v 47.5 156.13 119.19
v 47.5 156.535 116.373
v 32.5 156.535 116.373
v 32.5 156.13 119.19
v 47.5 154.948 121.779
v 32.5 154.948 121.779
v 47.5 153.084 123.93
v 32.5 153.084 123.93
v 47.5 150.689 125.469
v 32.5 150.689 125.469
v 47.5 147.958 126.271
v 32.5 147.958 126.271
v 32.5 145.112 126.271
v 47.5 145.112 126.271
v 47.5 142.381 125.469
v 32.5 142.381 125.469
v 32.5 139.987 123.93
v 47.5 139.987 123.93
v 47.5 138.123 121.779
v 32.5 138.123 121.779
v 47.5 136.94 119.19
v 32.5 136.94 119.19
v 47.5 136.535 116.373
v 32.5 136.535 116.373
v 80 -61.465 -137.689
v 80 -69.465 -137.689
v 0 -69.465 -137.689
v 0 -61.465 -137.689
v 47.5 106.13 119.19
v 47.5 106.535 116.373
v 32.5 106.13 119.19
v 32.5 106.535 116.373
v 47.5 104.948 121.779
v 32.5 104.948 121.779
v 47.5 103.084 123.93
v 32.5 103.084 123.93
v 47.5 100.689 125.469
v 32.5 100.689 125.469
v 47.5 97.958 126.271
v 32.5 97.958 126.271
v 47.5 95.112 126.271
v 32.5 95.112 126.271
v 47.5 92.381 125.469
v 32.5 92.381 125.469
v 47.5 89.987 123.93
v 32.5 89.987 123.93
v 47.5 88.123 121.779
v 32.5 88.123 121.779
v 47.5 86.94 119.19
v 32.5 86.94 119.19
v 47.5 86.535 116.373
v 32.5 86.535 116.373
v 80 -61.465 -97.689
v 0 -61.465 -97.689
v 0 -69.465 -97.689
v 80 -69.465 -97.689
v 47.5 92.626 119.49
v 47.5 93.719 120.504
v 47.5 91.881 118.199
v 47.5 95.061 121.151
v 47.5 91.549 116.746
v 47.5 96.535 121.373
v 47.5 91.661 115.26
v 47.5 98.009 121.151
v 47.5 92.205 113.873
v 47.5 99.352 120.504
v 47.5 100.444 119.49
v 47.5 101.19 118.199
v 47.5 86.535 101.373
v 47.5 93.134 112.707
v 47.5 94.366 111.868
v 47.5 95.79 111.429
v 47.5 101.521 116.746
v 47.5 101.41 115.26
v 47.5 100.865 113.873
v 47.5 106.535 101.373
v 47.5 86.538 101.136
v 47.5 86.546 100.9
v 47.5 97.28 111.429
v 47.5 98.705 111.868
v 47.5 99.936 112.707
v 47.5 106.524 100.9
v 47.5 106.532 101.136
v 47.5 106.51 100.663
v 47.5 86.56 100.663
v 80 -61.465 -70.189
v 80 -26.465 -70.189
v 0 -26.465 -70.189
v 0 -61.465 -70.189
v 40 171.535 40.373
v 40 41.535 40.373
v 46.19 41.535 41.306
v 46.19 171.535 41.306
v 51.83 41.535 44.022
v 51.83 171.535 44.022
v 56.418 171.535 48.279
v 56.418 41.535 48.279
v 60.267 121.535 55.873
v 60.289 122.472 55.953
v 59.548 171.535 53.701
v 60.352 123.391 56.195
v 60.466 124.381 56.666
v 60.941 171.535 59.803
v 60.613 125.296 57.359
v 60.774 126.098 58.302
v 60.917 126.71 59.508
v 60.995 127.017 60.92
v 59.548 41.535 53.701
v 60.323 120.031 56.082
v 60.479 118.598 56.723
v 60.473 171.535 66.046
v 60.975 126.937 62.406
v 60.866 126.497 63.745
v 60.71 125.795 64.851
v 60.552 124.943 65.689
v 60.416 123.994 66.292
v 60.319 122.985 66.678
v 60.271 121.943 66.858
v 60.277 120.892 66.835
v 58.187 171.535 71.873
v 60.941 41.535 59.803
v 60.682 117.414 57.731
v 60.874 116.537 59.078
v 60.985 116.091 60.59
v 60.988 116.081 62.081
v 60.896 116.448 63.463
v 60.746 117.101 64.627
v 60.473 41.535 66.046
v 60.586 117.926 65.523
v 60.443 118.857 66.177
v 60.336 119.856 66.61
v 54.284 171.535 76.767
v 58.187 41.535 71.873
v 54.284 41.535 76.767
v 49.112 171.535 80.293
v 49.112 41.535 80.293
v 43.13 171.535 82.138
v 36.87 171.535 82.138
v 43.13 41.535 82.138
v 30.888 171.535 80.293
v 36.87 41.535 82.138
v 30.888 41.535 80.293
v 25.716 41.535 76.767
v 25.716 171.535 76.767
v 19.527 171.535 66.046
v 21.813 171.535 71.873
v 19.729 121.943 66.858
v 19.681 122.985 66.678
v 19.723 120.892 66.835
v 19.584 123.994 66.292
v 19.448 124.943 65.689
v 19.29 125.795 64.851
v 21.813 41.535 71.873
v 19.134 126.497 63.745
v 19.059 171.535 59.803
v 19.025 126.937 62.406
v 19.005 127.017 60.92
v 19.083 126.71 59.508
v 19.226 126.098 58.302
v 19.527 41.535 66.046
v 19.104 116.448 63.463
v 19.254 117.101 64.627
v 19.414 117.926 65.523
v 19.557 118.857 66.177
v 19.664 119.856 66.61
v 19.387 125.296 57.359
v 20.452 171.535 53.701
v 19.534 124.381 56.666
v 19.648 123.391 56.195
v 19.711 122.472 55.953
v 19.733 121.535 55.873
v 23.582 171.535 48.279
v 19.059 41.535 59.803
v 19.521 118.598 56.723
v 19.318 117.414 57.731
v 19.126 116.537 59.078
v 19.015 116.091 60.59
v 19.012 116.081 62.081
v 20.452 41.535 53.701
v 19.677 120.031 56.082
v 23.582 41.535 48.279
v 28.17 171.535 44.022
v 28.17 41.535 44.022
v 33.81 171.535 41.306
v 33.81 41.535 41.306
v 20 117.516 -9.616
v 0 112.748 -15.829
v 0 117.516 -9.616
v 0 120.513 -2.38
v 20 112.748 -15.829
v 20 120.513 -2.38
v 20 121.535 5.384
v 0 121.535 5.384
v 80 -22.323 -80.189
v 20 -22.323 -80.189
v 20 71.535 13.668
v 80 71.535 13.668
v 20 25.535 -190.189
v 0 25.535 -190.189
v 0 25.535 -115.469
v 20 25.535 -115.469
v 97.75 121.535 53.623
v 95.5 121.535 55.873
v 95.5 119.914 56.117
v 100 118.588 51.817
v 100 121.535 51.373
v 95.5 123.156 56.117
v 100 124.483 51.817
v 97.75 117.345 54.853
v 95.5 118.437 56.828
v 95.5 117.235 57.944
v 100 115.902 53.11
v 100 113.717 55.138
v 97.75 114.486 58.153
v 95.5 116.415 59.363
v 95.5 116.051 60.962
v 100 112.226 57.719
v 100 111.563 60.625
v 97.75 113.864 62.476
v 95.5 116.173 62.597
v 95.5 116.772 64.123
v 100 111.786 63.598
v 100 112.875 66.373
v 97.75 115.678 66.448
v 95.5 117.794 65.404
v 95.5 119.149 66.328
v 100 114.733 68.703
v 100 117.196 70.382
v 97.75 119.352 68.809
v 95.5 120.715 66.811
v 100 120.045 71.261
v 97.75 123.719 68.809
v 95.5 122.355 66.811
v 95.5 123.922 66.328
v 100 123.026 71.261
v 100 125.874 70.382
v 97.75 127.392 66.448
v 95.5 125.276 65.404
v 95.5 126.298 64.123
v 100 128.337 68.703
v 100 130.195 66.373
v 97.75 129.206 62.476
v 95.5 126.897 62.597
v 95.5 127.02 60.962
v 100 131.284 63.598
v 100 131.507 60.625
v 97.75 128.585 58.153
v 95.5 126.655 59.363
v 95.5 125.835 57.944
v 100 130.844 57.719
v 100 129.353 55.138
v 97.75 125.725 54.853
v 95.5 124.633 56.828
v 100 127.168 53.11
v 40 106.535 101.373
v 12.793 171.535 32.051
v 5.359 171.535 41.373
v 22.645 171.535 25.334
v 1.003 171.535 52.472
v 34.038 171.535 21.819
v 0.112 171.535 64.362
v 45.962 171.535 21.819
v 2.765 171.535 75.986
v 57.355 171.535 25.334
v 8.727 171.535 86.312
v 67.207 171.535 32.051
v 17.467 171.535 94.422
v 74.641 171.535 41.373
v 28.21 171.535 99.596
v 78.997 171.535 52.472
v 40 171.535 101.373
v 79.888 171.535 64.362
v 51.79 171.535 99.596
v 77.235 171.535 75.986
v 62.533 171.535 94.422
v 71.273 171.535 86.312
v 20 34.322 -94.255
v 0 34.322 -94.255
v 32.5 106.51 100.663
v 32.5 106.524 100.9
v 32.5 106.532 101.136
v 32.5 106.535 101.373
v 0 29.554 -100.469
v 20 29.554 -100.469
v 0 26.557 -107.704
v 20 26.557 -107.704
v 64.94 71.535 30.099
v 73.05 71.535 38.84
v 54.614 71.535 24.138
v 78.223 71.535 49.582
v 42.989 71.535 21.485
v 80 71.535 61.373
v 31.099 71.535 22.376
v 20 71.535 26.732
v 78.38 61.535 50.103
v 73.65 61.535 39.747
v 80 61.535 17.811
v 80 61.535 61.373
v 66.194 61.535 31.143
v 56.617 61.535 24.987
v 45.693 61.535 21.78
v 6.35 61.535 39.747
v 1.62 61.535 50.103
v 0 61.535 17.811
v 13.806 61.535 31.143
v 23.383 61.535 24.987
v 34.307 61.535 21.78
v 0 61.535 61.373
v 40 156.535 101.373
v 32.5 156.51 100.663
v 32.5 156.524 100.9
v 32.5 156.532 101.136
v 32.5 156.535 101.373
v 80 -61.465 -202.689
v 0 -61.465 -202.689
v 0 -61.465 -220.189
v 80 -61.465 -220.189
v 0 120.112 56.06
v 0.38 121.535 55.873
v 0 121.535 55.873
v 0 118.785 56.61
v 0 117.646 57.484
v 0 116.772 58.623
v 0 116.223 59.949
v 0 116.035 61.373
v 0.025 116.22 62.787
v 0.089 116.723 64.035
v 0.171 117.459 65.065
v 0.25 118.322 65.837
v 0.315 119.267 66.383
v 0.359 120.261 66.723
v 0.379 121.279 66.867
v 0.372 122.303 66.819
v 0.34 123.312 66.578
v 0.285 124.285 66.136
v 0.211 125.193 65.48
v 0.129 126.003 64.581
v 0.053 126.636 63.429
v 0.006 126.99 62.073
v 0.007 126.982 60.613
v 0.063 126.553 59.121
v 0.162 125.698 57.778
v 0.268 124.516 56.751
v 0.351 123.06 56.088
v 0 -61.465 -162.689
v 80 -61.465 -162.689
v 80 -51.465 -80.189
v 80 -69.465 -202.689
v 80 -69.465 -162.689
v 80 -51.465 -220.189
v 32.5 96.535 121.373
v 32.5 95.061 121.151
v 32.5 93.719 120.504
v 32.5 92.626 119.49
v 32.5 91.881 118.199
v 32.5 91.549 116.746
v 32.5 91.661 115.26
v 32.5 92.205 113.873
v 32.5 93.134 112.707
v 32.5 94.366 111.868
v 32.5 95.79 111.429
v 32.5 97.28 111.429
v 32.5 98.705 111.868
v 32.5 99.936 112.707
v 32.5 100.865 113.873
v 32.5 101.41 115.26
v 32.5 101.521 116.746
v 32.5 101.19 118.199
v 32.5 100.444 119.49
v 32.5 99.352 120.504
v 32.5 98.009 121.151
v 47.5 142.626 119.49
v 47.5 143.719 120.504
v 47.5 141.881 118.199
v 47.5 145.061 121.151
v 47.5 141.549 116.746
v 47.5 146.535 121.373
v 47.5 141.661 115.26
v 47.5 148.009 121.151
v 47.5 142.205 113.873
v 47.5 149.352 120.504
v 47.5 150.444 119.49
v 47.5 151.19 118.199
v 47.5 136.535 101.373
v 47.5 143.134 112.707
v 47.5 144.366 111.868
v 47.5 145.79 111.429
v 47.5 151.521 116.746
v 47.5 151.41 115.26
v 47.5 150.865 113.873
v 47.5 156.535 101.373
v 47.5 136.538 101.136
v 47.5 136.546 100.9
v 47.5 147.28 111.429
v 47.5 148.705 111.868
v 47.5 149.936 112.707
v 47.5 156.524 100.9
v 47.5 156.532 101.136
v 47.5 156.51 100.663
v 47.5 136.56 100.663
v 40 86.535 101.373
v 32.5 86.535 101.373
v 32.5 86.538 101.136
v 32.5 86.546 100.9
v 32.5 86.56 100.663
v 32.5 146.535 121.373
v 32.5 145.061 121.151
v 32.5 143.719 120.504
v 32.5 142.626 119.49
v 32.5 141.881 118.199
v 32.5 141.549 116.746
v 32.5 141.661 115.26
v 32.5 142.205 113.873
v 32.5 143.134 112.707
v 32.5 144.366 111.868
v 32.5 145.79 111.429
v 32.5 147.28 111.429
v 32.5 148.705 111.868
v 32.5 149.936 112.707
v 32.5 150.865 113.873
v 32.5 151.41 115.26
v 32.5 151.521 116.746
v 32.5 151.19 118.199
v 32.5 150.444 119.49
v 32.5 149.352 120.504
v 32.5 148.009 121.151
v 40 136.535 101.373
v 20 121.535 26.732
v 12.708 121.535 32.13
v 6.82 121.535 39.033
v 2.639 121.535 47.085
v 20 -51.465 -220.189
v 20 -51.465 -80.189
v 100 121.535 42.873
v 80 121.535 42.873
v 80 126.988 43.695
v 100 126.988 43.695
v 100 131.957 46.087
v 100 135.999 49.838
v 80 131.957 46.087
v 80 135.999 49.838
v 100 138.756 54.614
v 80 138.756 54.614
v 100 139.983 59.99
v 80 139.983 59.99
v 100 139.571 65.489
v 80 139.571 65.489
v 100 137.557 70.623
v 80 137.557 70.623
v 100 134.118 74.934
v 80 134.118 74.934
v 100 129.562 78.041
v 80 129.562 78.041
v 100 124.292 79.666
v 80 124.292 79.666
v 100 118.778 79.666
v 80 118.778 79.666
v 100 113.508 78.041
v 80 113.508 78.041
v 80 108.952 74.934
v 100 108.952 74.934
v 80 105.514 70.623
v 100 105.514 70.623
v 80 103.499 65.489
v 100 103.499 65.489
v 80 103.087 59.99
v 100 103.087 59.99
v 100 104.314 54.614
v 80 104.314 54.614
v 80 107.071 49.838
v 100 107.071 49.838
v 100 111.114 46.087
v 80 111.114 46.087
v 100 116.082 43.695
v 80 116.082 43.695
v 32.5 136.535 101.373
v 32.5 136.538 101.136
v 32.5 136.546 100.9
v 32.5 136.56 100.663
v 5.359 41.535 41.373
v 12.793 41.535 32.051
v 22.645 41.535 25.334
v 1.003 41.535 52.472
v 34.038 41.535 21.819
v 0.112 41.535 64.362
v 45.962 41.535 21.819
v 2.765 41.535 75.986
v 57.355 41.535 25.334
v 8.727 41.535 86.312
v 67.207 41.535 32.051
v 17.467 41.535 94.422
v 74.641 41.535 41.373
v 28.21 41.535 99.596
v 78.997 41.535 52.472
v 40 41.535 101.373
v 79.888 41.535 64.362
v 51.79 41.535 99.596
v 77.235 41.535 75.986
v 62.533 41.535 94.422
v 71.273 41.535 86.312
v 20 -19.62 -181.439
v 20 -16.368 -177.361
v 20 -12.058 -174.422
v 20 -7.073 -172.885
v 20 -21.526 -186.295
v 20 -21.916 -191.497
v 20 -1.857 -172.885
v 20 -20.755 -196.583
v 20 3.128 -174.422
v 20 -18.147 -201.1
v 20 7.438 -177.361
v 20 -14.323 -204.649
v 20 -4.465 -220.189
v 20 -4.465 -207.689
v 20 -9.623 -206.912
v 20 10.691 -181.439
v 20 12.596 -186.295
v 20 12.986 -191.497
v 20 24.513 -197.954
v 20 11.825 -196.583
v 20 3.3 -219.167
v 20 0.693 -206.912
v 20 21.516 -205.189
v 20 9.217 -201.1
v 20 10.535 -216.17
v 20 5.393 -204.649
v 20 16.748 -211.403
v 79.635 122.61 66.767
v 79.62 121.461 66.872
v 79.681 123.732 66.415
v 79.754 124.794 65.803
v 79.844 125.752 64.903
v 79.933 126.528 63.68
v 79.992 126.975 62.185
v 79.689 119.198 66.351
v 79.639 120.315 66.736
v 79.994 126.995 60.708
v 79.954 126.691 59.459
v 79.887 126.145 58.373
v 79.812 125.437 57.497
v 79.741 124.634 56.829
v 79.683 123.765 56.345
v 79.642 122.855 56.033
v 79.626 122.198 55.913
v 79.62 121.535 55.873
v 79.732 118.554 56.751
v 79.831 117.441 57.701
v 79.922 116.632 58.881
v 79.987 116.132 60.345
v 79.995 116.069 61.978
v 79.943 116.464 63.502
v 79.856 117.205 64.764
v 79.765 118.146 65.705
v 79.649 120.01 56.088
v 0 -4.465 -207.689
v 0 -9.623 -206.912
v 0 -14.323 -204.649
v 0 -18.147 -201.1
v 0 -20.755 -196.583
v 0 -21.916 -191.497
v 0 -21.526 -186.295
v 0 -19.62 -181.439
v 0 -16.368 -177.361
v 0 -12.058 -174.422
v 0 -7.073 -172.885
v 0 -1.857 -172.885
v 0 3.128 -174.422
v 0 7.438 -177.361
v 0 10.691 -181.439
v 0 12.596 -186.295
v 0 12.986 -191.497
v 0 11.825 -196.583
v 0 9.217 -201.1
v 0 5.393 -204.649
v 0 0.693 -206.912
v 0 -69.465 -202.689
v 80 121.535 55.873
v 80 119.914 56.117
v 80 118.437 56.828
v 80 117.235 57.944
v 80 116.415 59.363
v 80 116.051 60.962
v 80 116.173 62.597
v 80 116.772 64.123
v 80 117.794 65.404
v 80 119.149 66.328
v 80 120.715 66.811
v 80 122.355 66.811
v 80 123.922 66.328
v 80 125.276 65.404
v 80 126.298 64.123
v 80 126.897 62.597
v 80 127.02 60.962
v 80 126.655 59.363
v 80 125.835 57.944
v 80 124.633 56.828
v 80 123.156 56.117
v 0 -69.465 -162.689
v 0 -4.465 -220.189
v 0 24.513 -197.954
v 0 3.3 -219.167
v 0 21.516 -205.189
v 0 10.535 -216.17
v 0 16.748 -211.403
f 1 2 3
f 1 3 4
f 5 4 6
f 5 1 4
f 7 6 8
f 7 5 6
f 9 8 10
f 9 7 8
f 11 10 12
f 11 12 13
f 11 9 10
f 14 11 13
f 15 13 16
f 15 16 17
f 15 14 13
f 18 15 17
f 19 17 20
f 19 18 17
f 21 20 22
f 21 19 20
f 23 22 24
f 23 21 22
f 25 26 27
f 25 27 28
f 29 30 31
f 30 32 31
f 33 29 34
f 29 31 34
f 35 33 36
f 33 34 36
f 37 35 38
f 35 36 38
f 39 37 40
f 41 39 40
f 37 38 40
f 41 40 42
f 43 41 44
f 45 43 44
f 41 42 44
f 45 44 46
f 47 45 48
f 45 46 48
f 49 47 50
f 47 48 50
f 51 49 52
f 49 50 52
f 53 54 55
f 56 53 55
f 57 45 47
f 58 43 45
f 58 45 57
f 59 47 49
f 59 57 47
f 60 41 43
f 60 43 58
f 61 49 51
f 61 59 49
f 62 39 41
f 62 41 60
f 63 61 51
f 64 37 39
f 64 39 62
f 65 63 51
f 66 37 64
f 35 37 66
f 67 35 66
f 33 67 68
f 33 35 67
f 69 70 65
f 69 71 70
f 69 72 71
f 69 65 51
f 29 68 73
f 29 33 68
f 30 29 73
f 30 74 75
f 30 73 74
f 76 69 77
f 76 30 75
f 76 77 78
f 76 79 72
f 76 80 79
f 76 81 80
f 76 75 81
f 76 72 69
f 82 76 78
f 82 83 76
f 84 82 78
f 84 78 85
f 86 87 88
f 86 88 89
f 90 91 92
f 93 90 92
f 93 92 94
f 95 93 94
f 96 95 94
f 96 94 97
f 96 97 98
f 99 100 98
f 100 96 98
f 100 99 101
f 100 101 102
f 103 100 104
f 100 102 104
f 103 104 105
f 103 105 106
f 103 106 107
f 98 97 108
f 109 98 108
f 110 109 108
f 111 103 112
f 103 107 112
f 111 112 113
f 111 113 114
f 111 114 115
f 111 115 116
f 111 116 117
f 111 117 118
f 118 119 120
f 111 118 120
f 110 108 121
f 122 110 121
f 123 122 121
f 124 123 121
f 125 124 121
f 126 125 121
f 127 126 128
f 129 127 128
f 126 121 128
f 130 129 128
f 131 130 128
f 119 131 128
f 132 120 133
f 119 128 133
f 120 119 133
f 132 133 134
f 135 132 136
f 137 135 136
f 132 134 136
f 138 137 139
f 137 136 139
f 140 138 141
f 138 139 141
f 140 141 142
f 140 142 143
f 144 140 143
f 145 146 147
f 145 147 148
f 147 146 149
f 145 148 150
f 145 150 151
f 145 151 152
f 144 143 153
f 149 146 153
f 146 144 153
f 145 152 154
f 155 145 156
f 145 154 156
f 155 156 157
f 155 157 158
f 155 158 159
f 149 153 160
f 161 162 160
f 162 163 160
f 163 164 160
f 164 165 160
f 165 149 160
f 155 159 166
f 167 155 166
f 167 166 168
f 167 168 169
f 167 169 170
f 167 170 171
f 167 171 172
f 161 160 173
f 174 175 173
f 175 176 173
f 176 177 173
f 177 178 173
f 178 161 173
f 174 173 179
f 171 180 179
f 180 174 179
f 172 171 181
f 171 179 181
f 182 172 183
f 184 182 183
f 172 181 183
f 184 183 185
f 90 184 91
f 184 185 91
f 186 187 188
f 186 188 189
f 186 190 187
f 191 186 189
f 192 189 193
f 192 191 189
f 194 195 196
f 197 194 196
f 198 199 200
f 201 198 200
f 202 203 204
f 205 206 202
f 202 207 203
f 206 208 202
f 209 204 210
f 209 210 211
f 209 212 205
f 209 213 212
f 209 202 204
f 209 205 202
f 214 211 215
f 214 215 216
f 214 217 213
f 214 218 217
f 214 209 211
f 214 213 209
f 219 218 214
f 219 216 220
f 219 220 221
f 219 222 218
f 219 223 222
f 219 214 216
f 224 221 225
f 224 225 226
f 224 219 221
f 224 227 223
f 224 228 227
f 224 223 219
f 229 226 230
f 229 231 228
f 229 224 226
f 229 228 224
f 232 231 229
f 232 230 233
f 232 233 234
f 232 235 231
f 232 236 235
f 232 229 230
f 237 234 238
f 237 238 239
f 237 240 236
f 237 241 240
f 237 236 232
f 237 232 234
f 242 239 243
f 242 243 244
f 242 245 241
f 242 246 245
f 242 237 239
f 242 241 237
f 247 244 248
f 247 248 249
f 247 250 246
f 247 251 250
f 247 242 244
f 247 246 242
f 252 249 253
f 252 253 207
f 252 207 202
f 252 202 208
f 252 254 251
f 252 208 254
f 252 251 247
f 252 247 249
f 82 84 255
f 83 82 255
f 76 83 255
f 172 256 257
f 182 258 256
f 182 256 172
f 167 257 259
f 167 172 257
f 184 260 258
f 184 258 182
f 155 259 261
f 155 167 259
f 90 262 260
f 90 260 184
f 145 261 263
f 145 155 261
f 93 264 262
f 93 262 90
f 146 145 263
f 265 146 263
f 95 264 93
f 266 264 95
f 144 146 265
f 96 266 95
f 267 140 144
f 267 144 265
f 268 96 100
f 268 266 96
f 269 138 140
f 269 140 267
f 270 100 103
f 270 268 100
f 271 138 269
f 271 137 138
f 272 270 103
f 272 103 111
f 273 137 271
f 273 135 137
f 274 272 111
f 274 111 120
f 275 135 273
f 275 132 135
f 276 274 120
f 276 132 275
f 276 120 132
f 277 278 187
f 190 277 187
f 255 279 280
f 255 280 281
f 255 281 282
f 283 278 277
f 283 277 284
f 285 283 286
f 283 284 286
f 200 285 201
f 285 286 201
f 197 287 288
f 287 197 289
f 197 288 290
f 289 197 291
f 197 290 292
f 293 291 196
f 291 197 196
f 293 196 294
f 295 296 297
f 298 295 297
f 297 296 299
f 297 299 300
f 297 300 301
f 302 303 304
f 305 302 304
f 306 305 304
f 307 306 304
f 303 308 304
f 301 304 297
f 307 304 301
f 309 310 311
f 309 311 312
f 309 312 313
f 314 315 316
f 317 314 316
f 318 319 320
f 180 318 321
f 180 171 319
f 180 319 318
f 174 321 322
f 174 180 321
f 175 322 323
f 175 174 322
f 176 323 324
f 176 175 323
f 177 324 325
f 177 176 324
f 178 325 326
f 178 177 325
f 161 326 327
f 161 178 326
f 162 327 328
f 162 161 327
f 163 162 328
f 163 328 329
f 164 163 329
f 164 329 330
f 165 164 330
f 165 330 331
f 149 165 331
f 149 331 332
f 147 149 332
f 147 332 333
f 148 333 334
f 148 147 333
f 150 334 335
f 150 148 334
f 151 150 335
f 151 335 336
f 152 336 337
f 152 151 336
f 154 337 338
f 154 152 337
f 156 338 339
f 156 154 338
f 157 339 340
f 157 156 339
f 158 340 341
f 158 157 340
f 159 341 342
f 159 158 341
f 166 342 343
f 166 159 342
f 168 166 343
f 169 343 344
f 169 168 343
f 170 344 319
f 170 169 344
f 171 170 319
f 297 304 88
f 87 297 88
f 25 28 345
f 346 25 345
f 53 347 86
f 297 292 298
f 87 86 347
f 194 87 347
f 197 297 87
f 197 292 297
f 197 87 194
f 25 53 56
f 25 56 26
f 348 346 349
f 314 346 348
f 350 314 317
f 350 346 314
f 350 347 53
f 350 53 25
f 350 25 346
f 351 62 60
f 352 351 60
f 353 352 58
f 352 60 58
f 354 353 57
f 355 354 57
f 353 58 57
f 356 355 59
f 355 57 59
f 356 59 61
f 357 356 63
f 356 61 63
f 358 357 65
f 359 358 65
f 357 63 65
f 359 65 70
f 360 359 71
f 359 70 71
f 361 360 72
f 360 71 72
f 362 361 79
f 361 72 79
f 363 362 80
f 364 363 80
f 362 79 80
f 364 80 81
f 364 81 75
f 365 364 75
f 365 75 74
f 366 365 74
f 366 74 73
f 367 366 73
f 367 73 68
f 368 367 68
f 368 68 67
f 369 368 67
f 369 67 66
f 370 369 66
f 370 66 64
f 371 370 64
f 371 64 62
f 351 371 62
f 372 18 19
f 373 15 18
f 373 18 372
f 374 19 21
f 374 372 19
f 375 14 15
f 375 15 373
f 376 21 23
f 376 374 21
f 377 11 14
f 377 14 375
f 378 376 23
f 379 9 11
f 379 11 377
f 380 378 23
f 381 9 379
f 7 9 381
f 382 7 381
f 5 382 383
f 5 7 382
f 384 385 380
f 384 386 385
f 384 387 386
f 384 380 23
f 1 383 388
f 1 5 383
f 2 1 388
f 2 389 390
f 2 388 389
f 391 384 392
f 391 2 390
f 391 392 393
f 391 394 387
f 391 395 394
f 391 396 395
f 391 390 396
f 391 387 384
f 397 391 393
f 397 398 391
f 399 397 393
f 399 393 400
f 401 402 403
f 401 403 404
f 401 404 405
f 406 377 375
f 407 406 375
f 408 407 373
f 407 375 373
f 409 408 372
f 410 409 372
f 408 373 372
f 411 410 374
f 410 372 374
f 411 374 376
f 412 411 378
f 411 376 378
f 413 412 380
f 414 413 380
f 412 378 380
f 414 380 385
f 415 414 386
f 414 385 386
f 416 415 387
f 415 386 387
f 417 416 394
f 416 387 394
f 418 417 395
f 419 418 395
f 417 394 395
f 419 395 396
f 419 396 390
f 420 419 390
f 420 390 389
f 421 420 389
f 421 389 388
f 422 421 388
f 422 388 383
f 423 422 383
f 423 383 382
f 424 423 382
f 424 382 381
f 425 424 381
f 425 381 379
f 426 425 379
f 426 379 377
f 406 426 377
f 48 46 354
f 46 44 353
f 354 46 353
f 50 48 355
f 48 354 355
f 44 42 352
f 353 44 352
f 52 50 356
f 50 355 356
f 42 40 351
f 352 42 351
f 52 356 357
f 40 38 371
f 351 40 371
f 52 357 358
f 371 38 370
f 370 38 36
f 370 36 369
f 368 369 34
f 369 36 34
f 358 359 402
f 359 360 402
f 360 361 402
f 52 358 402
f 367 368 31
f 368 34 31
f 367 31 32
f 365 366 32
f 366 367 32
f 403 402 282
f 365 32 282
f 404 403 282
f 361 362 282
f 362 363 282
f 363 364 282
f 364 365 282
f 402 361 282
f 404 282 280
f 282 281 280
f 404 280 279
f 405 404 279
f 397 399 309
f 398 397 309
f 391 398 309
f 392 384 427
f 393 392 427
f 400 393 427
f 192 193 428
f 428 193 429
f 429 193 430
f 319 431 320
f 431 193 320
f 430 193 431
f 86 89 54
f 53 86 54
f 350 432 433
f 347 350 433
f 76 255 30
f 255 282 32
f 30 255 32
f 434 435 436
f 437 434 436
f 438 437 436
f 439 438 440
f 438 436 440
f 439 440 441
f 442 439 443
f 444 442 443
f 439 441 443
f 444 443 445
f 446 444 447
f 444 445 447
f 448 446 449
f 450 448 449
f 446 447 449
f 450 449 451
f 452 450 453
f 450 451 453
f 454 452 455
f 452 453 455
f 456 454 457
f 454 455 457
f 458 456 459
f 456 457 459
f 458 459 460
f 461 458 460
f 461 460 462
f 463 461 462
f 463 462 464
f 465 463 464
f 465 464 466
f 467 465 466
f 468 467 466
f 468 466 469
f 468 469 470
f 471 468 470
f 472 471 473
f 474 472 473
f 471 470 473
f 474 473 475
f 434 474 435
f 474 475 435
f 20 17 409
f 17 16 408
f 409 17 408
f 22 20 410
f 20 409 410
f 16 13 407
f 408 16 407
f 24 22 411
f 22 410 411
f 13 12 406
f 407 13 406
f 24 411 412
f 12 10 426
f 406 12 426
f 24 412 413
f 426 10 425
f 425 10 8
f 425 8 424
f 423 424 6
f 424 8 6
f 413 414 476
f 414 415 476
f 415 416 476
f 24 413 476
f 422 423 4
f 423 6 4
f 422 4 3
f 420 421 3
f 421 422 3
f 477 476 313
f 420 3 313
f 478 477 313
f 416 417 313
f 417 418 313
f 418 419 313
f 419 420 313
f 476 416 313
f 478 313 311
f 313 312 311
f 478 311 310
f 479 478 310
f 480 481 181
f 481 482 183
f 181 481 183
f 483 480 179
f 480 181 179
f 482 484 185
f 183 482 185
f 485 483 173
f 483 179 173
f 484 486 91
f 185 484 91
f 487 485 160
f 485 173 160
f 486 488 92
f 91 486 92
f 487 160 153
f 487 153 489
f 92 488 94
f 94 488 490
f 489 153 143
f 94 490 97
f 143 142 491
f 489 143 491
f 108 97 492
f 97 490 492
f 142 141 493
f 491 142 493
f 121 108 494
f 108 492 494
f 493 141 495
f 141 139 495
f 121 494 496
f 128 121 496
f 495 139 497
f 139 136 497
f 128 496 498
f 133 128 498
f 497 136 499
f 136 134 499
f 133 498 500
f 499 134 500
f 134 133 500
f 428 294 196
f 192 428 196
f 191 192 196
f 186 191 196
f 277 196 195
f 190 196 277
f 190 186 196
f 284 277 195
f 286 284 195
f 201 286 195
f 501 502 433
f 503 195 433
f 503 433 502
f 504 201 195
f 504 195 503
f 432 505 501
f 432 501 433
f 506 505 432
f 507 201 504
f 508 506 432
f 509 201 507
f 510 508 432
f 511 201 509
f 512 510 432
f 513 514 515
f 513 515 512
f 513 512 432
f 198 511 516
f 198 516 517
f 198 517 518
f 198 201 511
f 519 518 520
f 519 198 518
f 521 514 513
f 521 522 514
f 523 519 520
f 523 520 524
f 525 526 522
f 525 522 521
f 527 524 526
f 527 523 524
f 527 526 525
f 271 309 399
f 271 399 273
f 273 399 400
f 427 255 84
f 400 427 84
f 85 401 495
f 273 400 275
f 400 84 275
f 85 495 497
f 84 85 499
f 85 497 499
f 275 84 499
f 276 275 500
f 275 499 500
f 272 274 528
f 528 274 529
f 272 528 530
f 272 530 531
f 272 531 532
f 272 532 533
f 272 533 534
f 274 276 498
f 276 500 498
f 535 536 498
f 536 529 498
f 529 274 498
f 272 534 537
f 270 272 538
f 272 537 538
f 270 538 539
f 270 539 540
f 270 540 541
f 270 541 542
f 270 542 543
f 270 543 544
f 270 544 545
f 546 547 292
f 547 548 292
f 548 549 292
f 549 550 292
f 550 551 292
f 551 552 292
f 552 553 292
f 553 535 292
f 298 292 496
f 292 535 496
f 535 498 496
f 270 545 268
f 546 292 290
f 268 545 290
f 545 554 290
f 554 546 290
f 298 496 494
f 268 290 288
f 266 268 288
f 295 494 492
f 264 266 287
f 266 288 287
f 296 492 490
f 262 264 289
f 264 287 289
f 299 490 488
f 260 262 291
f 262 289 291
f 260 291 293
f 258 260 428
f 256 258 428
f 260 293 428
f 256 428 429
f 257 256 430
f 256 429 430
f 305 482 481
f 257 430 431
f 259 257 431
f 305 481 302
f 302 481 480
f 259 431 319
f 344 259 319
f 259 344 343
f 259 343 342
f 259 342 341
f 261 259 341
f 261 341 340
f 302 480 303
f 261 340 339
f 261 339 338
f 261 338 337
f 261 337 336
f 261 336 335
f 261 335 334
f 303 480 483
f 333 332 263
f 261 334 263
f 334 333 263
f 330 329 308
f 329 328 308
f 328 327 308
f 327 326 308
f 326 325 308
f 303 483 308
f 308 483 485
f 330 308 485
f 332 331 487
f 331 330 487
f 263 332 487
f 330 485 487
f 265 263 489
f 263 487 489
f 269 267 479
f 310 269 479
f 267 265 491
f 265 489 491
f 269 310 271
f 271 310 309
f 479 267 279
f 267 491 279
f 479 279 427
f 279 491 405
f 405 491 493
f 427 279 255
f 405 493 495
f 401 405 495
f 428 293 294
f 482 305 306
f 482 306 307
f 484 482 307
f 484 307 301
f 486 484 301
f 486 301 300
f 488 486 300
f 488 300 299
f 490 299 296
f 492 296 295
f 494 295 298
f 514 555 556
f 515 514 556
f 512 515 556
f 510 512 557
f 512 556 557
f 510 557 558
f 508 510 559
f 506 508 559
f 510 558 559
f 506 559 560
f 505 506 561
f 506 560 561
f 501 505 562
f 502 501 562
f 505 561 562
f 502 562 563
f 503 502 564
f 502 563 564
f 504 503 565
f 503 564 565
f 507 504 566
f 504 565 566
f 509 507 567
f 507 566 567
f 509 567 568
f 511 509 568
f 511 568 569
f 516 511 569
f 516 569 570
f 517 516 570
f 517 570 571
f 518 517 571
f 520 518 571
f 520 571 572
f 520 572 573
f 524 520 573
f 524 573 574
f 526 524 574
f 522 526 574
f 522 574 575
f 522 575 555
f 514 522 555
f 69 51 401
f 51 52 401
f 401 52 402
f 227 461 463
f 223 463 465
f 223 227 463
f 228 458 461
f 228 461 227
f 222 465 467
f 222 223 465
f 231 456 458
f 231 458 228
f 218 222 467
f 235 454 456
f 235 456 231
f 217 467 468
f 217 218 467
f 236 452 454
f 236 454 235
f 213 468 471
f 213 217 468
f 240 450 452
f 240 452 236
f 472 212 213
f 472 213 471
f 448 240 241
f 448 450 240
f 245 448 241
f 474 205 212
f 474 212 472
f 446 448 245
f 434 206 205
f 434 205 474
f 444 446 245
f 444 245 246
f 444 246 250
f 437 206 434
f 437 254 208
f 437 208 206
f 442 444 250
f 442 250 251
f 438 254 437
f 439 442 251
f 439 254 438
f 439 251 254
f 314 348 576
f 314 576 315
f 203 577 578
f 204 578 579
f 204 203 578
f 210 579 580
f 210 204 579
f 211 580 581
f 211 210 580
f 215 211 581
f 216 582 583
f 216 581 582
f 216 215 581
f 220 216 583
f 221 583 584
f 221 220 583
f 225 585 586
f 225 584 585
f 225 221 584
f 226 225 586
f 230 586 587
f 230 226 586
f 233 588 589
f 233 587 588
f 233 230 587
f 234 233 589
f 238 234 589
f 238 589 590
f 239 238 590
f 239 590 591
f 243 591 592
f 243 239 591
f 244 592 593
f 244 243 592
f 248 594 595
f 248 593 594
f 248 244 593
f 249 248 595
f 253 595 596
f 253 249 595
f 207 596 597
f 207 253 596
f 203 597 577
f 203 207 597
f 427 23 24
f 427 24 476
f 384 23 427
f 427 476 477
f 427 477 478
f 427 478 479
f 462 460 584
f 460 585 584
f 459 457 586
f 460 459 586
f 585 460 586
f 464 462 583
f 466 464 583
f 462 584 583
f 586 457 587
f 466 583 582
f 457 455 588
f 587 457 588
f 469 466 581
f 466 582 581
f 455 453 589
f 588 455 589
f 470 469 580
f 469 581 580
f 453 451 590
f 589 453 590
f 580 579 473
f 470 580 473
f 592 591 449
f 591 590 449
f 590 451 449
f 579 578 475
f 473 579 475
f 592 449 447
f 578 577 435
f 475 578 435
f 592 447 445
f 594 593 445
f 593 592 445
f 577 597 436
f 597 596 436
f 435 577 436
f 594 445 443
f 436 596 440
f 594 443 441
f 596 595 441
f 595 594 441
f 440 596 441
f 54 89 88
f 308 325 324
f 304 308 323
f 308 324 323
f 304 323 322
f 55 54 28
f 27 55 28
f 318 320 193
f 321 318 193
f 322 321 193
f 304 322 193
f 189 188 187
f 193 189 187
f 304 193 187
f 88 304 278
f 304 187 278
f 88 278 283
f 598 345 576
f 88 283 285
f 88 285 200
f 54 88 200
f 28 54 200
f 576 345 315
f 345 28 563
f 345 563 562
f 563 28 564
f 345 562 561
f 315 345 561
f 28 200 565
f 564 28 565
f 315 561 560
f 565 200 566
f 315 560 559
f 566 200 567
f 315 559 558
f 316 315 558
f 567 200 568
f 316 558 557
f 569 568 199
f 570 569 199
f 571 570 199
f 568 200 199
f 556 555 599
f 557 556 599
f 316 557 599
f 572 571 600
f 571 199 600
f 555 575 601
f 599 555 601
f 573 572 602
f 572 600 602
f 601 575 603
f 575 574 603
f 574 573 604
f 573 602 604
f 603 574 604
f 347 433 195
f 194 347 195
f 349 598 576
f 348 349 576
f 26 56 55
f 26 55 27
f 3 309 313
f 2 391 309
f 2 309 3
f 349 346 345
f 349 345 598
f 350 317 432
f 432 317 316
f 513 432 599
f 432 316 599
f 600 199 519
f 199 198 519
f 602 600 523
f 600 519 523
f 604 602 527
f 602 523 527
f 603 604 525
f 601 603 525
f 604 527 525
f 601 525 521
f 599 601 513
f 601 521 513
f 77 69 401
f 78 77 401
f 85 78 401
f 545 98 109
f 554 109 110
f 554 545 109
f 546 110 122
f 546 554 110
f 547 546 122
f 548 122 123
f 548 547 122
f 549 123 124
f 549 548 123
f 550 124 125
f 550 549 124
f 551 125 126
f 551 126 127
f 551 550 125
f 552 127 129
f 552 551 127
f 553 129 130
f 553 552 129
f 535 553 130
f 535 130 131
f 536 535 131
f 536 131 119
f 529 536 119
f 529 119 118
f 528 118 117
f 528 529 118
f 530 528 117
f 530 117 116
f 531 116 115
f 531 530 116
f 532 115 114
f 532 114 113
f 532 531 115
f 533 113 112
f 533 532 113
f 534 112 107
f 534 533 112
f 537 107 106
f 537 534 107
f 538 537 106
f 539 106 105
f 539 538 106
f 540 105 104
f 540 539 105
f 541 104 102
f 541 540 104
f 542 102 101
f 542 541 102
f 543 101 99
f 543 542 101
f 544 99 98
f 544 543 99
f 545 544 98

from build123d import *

# Parameters (mm, degrees)
SKETCH1_W                  = 40
SKETCH1_H                  = 2.522686521
BOSS_EXTRUDE1_DEPTH        = 80
BOSS_EXTRUDE2_DEPTH        = 20
FILLET1_R                  = 30
F_25_0_35_DIAMETER_HOLE1_D = 35
BOSS_EXTRUDE3_DEPTH        = 50
BOSS_EXTRUDE3_DEPTH_BACK   = 80
SKETCH3_R                  = 40
BOSS_EXTRUDE4_DEPTH        = 7.5
F_25_0_42_DIAMETER_HOLE1_D = 42
F_10_0_10_DIAMETER_HOLE1_D = 10
SKETCH7_R                  = 18.5
BOSS_EXTRUDE5_DEPTH        = 20


with BuildPart() as part:
    # Sketch1 → Boss-Extrude1 (new body)
    with BuildSketch(Plane(origin=(0, 0, 0), x_dir=(0, 0, -1), z_dir=(1, 0, 0))):
        Polygon((137.68936662, -61.464817383), (97.68936662, -61.464817383), (97.68936662, -69.464817383), (137.68936662, -69.464817383), (137.68936662, -66.026855296), align=None)
        Polygon((-13.668497756, 71.535182617), (-61.372704525, 71.535182617), (-61.372704525, 61.535182617), (-17.81063338, 61.535182617), (70.18936662, -26.464817383), (70.18936662, -61.464817383), (97.68936662, -61.464817383), (97.68936662, -58.942130862), (137.68936662, -58.942130862), (137.68936662, -61.464817383), (150.18936662, -61.464817383), (150.18936662, -51.464817383), (80.18936662, -51.464817383), (80.18936662, -22.32268176), align=None)
        Polygon((220.18936662, -51.464817383), (150.18936662, -51.464817383), (150.18936662, -61.464817383), (162.68936662, -61.464817383), (162.68936662, -58.942130862), (202.68936662, -58.942130862), (202.68936662, -61.464817383), (220.18936662, -61.464817383), align=None)
        with Locations((182.68936662, -60.203474123)):
            Rectangle(SKETCH1_W, SKETCH1_H)
        Polygon((202.68936662, -61.464817383), (162.68936662, -61.464817383), (162.68936662, -66.026855296), (162.68936662, -69.464817383), (202.68936662, -69.464817383), align=None)
        with Locations((117.68936662, -60.203474123)):
            Rectangle(SKETCH1_W, SKETCH1_H)
    extrude(amount=BOSS_EXTRUDE1_DEPTH)

    # Sketch1<5> → Boss-Extrude2 (add)
    with BuildSketch(Plane(origin=(0, 0, 0), x_dir=(0, 0, -1), z_dir=(1, 0, 0))):
        Polygon((-61.372704525, 121.535182617), (-61.372704525, 71.535182617), (-13.668497756, 71.535182617), (80.18936662, -22.32268176), (80.18936662, -51.464817383), (220.18936662, -51.464817383), (220.18936662, 25.535182617), (103.042180363, 25.535182617), (7.042180363, 121.535182617), align=None)
    extrude(amount=BOSS_EXTRUDE2_DEPTH)

    # Fillet1
    fillet1_edges = [part.edges().sort_by_distance(p)[0] for p in [
        (10, 121.535182617, -7.042180363),
        (10, 25.535182617, -220.18936662),
        (10, 25.535182617, -103.042180363),
    ]]
    fillet(fillet1_edges, radius=FILLET1_R)

    # Ø25.0 (35) Diameter Hole1 (through all)
    with Locations(Plane(origin=(20, -4.464817383, -190.18936662), x_dir=(0, 0, 1), z_dir=(1, 0, 0))):
        with Locations((0, 0)):
            Hole(F_25_0_35_DIAMETER_HOLE1_D / 2)

    # Sketch3 → Boss-Extrude3 (add, two sides: drawn at the far end of the back side and taken through both)
    with BuildSketch(Plane(origin=(0, 121.535182617, 0), x_dir=(1, 0, 0), z_dir=(0, 1, 0)).offset(-BOSS_EXTRUDE3_DEPTH_BACK)):
        with Locations(Location((40, -61.372704525, 0), (0, 0, 270))):
            Circle(SKETCH3_R)
    extrude(amount=BOSS_EXTRUDE3_DEPTH + BOSS_EXTRUDE3_DEPTH_BACK)

    # Sketch4 → Boss-Extrude4 (add, symmetric)
    with BuildSketch(Plane.ZY.offset(-40)):
        with BuildLine():
            Line((101.372704525, 156.535182617), (116.372704525, 156.535182617))
            ThreePointArc((116.372704525, 156.535182617), (126.372704525, 146.535182617), (116.372704525, 136.535182617))
            Line((116.372704525, 136.535182617), (101.372704525, 136.535182617))
            ThreePointArc((101.372704525, 136.535182617), (91.372704525, 146.535182617), (101.372704525, 156.535182617))
        make_face()
        with BuildLine():
            Line((101.372704525, 106.535182617), (116.372704525, 106.535182617))
            ThreePointArc((116.372704525, 106.535182617), (126.372704525, 96.535182617), (116.372704525, 86.535182617))
            Line((116.372704525, 86.535182617), (101.372704525, 86.535182617))
            ThreePointArc((101.372704525, 86.535182617), (91.372704525, 96.535182617), (101.372704525, 106.535182617))
        make_face()
    extrude(amount=BOSS_EXTRUDE4_DEPTH, both=True)

    # Ø25.0 (42) Diameter Hole1 (through all)
    with Locations(Plane(origin=(40, 171.535182617, 61.372704525), x_dir=(0, 0, 1), z_dir=(0, 1, 0))):
        with Locations((0, 0)):
            Hole(F_25_0_42_DIAMETER_HOLE1_D / 2)

    # Ø10.0 (10) Diameter Hole1 (through all)
    with Locations(Plane(origin=(32.5, 146.535182617, 116.372704525), x_dir=(0, 0, -1), z_dir=(-1, 0, 0))):
        with Locations((0, 0), (0, 50)):
            Hole(F_10_0_10_DIAMETER_HOLE1_D / 2)


with BuildPart() as body_2:
    # Sketch7 → Boss-Extrude5 (new body)
    with BuildSketch(Plane(origin=(80, 0, 0), x_dir=(0, 0, -1), z_dir=(1, 0, 0))):
        with Locations((-61.372704525, 121.535182617)):
            Circle(SKETCH7_R)
    extrude(amount=BOSS_EXTRUDE5_DEPTH)


with BuildPart() as csk_for_m10_flat_head_machine_screw1_tool:
    # Sketch8 → CSK for M10 Flat Head Machine Screw1 (revolve)
    with BuildSketch(Plane(origin=(100, 121.535182617, 61.372704525), x_dir=(0, 0, -1), z_dir=(0, 1, 0))):
        Polygon((0, 0), (0, 100), (5.5, 100), (5.5, 4.5), (10, 0), align=None)
    revolve(axis=Axis((106.35, 121.535182617, 61.372704525), (-1, 0, 0)))


with BuildPart() as part_1:
    add(part.part)

    # CSK for M10 Flat Head Machine Screw1: cut by csk_for_m10_flat_head_machine_screw1_tool
    add(csk_for_m10_flat_head_machine_screw1_tool.part, mode=Mode.SUBTRACT)


with BuildPart() as body_2_1:
    add(body_2.part)

    # CSK for M10 Flat Head Machine Screw1: cut by csk_for_m10_flat_head_machine_screw1_tool
    add(csk_for_m10_flat_head_machine_screw1_tool.part, mode=Mode.SUBTRACT)


solid = Compound([part_1.part, body_2_1.part])
